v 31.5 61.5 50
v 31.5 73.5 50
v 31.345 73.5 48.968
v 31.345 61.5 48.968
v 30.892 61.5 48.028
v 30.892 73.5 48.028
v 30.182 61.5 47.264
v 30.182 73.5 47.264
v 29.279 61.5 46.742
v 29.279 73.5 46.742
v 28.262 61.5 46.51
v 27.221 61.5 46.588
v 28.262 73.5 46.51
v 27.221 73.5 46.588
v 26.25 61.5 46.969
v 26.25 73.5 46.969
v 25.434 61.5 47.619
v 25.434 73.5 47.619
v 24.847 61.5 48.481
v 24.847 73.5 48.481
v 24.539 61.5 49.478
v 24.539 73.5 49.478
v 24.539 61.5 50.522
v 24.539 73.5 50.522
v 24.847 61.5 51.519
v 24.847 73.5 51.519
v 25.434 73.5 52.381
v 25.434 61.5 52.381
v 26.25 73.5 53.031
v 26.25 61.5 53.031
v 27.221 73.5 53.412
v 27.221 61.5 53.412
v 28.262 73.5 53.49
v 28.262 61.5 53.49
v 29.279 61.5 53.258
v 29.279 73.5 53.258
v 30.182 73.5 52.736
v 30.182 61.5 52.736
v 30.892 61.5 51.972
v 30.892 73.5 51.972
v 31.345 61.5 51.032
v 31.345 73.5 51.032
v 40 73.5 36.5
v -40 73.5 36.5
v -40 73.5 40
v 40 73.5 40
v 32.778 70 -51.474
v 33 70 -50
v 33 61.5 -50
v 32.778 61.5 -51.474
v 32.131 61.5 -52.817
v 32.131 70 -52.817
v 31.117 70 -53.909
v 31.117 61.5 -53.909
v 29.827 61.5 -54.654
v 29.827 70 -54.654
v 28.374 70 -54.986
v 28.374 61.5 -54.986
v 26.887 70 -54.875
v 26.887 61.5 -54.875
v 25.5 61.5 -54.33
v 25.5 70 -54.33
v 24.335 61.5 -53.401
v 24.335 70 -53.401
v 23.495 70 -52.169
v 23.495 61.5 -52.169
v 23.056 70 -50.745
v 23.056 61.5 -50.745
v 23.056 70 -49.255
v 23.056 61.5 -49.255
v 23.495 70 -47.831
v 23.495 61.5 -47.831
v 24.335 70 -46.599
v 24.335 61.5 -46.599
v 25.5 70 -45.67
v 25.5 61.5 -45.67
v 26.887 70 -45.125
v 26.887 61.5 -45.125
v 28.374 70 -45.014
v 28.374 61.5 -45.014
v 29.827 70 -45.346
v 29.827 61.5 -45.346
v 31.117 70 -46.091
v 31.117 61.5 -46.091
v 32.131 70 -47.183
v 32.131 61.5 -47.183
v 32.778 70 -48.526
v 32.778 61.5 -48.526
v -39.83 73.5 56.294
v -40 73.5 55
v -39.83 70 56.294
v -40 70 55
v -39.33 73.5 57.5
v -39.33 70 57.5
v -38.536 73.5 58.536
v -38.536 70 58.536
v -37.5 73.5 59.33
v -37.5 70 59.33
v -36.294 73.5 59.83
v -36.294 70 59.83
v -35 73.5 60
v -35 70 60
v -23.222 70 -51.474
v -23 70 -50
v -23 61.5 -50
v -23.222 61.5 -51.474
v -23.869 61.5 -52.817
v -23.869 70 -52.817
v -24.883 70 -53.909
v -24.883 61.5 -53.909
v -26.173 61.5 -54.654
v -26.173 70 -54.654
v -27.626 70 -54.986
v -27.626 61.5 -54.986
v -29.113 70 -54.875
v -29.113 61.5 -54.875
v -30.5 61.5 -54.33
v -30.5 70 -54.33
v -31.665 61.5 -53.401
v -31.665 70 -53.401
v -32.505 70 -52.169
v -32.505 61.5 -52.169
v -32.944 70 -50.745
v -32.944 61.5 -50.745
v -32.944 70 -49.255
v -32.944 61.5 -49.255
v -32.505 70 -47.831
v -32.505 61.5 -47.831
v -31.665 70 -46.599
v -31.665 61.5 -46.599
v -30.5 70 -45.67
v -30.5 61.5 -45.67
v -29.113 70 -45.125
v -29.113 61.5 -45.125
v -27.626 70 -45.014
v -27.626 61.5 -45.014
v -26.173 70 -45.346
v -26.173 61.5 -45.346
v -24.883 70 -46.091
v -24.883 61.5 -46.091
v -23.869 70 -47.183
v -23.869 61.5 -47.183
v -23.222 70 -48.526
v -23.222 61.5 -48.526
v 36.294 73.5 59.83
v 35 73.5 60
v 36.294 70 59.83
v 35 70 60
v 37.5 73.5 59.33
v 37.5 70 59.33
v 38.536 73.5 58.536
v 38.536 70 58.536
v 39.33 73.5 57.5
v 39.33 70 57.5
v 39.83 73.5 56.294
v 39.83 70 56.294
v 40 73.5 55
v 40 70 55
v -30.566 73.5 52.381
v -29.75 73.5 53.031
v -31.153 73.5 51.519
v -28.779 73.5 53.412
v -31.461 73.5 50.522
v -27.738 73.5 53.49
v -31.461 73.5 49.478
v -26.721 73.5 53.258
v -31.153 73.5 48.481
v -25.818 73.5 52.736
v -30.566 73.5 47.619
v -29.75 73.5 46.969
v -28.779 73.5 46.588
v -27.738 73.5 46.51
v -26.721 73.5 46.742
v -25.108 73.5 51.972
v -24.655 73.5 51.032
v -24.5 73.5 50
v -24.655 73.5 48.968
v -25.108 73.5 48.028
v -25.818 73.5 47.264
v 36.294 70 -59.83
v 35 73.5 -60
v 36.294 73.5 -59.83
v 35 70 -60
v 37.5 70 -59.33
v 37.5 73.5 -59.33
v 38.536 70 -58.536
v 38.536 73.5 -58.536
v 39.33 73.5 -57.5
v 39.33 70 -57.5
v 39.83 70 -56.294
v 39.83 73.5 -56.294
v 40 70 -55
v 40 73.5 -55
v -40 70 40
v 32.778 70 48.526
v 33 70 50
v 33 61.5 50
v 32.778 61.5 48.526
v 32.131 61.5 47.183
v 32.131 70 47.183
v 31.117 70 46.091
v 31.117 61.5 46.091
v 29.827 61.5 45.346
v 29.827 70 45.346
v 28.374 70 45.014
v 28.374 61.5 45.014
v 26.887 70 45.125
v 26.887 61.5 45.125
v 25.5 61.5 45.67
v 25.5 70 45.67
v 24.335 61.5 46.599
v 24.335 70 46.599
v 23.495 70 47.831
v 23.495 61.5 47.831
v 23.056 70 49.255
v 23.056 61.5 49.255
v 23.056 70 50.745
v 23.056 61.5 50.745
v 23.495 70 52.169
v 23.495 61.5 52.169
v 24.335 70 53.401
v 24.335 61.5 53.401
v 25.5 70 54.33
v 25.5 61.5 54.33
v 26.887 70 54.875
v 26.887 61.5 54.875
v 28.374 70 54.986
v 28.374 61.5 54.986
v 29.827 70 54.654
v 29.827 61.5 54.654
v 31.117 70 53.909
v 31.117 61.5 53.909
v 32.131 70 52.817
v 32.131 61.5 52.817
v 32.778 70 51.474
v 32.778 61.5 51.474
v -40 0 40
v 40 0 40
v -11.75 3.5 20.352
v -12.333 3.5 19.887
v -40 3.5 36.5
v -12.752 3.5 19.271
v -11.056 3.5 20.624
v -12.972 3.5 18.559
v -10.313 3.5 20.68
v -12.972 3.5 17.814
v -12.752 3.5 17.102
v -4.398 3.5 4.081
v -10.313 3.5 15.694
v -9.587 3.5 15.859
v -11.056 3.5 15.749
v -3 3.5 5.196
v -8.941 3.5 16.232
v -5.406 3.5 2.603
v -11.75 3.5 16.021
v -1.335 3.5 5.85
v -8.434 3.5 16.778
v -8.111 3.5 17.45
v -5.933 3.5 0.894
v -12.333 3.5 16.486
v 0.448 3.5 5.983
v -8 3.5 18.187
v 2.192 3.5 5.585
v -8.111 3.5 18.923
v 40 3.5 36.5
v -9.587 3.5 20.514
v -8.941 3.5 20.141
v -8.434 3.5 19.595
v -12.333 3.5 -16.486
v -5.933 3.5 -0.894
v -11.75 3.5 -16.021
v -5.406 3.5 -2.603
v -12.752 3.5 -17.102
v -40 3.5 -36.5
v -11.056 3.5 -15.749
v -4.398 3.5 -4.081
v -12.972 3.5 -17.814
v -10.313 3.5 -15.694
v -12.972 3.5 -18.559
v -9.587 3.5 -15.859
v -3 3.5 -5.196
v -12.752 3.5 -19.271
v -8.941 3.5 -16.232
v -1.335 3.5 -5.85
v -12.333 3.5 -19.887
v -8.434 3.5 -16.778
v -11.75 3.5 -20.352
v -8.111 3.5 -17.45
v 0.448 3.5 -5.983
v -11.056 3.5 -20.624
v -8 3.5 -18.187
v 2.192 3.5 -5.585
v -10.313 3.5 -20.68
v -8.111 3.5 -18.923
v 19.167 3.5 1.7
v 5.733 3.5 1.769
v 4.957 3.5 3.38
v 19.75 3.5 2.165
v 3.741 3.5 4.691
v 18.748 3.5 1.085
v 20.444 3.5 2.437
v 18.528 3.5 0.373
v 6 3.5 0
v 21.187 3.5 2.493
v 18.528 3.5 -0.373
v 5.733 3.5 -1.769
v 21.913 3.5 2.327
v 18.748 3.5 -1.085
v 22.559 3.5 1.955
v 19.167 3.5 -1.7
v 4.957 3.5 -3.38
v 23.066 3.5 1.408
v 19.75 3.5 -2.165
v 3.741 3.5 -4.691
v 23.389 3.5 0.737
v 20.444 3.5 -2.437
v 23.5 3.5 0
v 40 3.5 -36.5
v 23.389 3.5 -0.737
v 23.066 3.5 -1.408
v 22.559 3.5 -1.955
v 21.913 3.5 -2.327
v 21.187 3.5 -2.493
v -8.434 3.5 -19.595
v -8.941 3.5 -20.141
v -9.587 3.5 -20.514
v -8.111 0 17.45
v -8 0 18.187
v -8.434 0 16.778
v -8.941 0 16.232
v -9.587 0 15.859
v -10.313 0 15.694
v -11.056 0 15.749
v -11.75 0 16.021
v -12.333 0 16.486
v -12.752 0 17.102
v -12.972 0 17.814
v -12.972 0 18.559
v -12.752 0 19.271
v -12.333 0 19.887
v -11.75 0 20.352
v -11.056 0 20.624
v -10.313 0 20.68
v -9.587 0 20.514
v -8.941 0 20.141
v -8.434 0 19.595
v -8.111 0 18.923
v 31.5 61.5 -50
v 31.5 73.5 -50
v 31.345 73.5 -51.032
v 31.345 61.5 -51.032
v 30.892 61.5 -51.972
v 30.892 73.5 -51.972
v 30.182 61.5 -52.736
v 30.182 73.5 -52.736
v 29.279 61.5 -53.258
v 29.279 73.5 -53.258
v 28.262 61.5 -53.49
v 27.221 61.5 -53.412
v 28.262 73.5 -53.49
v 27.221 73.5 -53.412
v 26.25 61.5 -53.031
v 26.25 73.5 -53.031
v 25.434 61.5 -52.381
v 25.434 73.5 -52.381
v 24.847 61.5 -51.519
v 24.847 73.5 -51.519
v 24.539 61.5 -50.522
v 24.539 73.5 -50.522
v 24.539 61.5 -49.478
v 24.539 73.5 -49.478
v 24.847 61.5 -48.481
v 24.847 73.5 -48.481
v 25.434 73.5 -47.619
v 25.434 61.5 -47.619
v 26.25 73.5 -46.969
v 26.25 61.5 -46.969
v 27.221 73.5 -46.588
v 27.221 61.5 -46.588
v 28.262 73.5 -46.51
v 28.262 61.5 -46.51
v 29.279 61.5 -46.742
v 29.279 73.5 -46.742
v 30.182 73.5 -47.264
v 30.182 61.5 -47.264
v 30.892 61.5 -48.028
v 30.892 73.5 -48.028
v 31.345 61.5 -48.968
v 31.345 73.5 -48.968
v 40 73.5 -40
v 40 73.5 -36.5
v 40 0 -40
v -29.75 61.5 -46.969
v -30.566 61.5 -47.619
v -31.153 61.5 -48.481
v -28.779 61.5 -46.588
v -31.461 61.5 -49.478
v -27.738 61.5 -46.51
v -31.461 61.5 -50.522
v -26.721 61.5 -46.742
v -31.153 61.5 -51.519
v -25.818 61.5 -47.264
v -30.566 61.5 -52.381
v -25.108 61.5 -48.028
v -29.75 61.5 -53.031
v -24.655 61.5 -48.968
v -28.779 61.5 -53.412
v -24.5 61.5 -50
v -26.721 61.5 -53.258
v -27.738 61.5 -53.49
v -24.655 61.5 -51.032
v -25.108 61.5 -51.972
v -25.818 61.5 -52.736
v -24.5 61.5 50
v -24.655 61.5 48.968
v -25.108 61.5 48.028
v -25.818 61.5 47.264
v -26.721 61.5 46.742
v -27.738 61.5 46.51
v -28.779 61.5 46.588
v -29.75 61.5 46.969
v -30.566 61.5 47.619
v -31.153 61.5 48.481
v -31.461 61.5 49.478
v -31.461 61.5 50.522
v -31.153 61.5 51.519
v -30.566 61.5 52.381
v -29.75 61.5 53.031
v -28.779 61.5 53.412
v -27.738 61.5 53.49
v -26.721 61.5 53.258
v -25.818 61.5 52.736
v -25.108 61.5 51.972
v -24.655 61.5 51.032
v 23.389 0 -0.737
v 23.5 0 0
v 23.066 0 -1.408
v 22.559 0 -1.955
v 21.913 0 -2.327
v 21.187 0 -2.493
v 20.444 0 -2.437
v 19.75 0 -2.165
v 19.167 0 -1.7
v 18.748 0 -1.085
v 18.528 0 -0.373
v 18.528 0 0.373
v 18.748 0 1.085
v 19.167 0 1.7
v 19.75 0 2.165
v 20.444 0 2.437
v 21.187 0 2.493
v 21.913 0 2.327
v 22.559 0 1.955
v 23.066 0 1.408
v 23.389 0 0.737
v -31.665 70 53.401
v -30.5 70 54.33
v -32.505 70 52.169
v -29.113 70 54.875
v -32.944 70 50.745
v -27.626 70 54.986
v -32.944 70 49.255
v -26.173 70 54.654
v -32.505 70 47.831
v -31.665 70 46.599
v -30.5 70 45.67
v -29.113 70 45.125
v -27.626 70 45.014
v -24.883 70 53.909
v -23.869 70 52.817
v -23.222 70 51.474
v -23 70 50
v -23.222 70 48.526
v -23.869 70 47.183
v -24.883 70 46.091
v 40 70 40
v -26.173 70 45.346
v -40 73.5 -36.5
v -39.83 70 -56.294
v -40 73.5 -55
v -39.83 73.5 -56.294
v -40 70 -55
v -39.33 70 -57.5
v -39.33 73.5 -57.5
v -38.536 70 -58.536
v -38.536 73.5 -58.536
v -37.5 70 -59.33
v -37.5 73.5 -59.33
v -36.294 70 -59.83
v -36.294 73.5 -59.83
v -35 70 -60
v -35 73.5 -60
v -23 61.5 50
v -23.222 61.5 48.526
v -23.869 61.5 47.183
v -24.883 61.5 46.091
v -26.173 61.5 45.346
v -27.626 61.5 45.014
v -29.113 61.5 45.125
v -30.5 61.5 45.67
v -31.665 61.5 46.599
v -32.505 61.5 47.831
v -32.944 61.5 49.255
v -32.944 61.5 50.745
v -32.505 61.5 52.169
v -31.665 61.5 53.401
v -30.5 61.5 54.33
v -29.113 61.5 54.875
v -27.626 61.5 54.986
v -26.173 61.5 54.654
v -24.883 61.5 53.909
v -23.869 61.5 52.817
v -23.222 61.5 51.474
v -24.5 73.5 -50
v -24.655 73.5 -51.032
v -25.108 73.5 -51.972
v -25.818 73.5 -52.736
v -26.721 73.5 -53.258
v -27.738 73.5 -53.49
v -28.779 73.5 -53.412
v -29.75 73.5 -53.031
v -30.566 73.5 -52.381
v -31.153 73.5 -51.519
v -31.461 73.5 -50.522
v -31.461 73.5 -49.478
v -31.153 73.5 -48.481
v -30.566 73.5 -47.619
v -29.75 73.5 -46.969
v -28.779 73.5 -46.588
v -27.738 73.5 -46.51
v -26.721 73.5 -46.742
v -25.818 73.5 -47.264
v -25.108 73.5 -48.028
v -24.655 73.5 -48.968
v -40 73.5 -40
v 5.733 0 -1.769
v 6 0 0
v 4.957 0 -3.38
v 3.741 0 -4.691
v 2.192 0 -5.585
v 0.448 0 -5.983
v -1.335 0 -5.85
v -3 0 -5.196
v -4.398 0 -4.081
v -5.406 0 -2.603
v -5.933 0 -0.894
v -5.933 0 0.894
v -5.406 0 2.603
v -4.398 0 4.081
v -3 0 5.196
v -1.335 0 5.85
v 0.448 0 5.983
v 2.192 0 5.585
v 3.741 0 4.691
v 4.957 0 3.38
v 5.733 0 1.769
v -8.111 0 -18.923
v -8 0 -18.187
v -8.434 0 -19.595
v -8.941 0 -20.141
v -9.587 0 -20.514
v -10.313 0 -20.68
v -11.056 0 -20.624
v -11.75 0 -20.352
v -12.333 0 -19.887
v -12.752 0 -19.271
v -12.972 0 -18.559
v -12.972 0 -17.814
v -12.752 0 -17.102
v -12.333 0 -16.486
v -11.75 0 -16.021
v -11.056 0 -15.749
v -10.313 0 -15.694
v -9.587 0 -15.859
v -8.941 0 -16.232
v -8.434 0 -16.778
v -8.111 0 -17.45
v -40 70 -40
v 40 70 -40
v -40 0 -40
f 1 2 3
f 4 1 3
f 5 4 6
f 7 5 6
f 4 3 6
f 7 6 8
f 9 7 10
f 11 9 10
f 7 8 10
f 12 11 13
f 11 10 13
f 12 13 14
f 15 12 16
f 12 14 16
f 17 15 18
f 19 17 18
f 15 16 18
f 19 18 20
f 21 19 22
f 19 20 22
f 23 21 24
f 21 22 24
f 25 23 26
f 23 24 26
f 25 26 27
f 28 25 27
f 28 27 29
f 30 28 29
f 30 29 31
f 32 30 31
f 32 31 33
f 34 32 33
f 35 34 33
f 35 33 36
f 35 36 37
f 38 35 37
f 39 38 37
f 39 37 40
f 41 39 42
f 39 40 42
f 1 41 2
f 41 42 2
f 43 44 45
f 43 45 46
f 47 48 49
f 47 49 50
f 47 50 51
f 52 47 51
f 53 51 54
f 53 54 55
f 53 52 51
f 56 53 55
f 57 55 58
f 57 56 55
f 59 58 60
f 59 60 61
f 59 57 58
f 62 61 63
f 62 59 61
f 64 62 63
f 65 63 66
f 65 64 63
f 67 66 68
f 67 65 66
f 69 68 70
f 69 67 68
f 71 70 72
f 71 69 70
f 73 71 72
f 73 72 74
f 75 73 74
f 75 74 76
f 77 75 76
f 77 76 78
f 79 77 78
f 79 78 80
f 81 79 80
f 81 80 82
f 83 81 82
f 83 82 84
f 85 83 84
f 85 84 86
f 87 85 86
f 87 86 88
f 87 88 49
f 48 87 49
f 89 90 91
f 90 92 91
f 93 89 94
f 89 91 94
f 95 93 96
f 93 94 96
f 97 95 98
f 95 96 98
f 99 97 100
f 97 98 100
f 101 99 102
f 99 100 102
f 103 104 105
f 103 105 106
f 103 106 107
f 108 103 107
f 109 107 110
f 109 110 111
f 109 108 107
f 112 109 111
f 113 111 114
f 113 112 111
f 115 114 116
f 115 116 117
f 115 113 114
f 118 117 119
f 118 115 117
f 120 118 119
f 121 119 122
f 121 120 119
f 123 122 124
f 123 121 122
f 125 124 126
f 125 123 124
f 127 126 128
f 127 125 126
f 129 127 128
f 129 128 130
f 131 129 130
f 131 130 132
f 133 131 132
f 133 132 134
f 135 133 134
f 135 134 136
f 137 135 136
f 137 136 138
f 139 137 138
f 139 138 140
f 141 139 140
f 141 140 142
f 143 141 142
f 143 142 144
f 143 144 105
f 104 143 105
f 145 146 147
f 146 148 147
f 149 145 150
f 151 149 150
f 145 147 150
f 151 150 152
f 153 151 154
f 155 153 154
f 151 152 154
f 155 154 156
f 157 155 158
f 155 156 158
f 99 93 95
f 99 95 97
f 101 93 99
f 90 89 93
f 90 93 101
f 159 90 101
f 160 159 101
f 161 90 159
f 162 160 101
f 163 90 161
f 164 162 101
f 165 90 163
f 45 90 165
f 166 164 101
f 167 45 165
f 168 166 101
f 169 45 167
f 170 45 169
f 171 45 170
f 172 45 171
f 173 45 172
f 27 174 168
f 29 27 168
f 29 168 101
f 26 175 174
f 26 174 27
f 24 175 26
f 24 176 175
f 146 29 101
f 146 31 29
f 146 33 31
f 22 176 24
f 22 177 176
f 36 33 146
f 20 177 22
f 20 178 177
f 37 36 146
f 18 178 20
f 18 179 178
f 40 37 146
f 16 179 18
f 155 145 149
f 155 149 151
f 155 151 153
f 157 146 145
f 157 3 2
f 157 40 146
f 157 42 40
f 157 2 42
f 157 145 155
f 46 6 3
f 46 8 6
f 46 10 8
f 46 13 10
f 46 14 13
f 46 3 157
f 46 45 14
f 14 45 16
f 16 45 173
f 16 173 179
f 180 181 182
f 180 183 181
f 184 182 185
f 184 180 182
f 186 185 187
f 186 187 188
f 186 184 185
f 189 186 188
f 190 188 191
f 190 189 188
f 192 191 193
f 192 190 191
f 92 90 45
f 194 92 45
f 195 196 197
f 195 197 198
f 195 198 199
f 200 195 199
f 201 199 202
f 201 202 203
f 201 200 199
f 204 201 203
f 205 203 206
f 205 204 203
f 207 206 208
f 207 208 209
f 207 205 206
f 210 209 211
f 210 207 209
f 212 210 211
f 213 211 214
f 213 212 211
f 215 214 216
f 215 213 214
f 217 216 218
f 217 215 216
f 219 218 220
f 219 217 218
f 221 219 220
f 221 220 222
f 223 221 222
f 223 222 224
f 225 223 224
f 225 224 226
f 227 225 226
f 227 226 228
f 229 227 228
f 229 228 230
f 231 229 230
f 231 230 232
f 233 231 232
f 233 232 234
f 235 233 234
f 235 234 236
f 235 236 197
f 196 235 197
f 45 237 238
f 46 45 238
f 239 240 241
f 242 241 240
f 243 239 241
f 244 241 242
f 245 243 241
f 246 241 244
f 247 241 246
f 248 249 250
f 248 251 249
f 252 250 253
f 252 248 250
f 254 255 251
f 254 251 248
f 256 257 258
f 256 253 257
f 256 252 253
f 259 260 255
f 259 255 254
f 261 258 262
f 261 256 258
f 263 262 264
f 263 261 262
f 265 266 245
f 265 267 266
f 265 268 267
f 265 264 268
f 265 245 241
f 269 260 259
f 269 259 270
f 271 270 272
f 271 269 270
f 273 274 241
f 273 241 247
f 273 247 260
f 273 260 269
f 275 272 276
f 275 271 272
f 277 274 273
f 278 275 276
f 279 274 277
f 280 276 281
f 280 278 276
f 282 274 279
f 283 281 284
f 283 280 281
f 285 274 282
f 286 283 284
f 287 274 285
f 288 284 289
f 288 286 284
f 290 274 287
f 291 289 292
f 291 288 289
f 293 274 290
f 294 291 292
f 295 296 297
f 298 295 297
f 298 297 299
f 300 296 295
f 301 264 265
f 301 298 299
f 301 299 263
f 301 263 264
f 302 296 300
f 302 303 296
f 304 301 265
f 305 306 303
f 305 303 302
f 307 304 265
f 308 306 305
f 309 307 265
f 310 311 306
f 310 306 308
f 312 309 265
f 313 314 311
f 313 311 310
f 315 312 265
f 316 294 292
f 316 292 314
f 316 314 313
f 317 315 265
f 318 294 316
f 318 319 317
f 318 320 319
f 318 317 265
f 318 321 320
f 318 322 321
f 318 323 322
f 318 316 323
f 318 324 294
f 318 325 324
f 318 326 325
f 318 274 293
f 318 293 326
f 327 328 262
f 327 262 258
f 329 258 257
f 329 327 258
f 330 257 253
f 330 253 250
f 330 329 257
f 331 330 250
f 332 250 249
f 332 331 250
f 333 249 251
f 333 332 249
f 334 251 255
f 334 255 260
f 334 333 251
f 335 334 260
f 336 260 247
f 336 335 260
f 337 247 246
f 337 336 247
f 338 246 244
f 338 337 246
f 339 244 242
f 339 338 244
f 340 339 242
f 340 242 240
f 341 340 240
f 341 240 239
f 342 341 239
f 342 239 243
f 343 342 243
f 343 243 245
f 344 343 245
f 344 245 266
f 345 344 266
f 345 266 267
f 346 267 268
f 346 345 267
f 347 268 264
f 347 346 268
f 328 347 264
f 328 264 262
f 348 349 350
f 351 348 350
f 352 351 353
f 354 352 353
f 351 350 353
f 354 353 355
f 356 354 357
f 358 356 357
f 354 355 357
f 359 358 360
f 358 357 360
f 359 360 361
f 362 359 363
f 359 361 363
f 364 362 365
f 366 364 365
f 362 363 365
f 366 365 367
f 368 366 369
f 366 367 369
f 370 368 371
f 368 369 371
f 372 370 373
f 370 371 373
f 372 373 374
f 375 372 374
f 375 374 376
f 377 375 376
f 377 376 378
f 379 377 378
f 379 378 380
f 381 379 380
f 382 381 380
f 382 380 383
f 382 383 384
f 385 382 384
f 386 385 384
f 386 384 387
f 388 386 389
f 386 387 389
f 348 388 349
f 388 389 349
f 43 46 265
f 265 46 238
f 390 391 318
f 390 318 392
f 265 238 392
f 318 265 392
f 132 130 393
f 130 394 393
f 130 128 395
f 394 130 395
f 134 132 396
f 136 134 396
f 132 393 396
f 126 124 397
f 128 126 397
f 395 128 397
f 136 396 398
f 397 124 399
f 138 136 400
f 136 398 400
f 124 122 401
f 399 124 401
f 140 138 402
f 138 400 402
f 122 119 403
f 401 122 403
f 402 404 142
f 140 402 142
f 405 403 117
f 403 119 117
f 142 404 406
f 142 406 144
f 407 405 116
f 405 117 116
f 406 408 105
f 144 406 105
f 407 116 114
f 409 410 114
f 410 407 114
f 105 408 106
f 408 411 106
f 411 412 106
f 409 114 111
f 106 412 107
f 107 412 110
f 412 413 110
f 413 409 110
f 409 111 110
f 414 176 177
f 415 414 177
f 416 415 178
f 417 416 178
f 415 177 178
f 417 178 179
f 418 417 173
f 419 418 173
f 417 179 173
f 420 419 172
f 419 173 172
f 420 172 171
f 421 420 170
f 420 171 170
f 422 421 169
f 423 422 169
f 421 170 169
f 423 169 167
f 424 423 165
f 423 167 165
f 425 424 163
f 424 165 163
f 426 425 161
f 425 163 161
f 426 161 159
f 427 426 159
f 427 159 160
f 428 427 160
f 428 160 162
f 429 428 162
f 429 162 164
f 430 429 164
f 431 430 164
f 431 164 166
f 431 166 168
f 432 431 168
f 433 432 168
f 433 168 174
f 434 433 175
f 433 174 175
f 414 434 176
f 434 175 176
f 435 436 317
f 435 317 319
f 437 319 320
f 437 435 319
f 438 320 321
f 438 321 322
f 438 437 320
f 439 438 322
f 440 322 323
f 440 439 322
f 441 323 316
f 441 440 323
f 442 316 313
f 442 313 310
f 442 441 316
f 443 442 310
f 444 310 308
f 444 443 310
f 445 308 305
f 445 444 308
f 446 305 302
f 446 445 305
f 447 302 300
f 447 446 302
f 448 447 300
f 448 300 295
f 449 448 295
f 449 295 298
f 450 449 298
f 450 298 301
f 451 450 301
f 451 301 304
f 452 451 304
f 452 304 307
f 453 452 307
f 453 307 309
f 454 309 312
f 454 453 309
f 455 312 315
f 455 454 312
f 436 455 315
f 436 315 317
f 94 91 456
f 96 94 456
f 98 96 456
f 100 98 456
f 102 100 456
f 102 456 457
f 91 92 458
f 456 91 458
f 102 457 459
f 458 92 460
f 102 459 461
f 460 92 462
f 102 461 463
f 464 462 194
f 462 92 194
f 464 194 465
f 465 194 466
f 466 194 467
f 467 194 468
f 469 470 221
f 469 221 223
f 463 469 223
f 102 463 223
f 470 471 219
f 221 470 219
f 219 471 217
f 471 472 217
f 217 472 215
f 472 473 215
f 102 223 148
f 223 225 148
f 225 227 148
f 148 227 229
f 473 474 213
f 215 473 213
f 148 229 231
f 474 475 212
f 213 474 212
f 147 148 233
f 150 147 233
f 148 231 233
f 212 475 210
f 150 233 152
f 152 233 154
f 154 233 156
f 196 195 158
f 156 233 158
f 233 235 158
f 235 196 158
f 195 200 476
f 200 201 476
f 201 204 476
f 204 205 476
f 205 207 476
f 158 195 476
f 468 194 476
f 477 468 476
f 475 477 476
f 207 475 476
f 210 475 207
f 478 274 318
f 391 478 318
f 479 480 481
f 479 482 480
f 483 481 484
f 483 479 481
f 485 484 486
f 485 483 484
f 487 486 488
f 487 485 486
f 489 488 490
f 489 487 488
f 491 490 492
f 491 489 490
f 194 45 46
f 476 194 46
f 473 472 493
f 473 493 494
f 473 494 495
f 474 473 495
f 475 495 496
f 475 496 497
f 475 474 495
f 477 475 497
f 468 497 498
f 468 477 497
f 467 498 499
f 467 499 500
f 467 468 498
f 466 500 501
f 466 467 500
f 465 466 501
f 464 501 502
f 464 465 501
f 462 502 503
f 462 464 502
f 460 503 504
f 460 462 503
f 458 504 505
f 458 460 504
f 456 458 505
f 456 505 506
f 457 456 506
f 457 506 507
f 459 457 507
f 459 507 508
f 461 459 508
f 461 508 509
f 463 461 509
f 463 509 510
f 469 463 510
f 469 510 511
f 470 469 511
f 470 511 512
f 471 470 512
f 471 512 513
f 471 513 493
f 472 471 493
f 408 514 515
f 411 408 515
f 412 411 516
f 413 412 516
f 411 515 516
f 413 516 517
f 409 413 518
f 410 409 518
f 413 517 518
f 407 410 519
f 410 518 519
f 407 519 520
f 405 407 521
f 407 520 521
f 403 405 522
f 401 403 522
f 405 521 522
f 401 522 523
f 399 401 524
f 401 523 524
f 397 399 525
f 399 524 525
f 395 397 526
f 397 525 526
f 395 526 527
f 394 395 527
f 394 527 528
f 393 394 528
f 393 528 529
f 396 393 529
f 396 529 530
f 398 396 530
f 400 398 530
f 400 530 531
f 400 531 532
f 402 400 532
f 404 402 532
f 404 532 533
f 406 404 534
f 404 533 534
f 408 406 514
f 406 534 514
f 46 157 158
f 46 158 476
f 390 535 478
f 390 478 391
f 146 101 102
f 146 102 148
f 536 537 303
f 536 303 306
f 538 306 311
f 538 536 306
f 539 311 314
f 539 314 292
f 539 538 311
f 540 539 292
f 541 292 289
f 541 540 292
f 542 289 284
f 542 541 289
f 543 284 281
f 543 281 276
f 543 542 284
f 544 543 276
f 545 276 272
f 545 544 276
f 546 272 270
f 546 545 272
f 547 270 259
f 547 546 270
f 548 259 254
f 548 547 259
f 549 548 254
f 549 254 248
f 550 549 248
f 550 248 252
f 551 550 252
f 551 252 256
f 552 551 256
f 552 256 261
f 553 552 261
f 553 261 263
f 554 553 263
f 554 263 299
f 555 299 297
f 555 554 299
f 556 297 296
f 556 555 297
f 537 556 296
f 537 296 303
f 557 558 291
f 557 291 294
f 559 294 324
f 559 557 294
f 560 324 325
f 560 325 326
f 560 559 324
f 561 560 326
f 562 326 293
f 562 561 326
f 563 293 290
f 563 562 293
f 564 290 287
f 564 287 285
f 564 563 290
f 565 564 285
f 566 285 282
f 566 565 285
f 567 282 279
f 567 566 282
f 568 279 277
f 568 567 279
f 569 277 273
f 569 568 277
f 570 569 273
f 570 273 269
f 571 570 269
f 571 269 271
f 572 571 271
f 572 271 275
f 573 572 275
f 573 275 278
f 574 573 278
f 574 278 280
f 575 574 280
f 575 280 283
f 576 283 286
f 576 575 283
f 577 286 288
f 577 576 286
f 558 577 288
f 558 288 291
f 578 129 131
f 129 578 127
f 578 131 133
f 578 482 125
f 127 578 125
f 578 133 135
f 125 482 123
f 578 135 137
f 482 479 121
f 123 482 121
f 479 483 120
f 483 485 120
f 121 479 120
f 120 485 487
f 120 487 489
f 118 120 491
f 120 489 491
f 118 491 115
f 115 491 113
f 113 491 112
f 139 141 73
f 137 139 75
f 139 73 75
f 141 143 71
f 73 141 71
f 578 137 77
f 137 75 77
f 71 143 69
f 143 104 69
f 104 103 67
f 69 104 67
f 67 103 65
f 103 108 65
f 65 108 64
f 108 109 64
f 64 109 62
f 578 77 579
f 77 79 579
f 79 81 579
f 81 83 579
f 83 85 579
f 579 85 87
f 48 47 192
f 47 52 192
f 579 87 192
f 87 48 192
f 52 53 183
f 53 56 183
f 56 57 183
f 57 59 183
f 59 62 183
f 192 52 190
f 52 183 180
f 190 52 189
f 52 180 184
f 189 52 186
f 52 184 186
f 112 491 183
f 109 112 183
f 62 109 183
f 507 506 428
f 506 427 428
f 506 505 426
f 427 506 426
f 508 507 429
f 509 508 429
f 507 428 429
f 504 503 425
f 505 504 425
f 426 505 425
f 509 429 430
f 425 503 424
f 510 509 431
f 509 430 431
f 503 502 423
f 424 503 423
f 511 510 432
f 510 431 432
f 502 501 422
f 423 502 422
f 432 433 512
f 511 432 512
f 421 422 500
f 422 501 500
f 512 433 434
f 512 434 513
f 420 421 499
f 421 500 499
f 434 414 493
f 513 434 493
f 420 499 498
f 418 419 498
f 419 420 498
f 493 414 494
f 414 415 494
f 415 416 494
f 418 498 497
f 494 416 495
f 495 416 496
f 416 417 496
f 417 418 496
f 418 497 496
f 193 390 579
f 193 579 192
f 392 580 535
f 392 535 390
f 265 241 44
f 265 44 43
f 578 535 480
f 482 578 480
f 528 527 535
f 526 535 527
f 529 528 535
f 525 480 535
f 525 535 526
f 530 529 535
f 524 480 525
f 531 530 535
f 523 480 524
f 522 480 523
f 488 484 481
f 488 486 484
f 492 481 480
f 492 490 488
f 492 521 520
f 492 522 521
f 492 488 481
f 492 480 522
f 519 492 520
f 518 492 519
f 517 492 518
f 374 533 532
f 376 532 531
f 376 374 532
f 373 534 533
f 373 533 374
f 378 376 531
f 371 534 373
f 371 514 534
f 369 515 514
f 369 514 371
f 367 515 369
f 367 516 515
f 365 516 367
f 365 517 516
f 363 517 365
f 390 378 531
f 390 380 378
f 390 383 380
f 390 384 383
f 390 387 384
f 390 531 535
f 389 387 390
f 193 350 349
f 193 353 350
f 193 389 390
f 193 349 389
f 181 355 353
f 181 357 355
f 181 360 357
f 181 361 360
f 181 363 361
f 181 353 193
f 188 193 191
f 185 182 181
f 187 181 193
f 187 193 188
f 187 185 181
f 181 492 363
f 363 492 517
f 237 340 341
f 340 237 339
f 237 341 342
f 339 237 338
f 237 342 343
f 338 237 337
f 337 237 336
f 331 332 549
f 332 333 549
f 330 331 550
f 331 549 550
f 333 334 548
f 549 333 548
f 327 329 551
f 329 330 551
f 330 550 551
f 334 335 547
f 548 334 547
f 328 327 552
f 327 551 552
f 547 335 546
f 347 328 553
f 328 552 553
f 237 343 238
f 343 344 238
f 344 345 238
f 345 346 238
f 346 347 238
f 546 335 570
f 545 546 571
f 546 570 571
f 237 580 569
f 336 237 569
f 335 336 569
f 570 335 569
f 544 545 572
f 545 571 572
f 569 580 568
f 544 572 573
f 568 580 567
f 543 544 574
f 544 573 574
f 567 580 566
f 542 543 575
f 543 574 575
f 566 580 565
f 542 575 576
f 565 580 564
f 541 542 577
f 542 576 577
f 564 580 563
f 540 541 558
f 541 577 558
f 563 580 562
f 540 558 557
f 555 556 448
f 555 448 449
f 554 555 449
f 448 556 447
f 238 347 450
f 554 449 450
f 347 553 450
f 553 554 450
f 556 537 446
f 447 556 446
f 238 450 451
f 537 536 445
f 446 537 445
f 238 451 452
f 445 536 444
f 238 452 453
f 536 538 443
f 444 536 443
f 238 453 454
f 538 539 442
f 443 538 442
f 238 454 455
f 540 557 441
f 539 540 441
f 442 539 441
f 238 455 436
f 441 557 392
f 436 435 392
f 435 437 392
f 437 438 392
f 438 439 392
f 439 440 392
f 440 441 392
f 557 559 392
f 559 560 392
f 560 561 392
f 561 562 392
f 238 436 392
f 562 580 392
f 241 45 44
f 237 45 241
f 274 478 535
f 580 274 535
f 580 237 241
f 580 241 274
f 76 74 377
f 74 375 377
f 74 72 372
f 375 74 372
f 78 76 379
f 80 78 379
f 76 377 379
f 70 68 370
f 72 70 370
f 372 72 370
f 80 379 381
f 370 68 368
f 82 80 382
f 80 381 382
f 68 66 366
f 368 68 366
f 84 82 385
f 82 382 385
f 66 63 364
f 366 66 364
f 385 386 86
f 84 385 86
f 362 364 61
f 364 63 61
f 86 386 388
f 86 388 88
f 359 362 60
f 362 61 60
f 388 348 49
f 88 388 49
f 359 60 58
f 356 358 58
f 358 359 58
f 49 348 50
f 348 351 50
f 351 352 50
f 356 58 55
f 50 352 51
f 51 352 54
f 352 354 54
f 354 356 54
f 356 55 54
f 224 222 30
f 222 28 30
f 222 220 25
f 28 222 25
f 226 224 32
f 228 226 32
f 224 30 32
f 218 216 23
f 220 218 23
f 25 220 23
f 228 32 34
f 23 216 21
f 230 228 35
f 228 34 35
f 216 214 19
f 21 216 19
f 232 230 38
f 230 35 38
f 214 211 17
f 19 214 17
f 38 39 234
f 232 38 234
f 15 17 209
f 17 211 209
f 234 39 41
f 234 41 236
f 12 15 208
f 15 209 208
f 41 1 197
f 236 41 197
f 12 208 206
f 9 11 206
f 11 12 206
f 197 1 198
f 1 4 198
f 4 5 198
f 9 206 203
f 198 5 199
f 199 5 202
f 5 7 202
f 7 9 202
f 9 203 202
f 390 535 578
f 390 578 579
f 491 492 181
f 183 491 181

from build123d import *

# Parameters (mm, degrees)
SKETCH1_W             = 80
SKETCH1_H             = 80
SKETCH1_R             = 2.5
SKETCH1_R_2           = 6
BOSS_EXTRUDE1_DEPTH   = 3.5
BOSS_EXTRUDE2_START   = 3.5
SKETCH1_4_W           = 80
SKETCH1_4_H           = 3.5
BOSS_EXTRUDE2_DEPTH   = 70
BOSS_EXTRUDE3_START   = 73.5
SKETCH1_5_W           = 80
SKETCH1_5_H           = 20
SKETCH1_5_R           = 5
BOSS_EXTRUDE3_DEPTH   = 3.5
BOSS_EXTRUDE3_2_DEPTH = 3.5
BOSS_EXTRUDE4_START   = 73.5
SKETCH1_6_R           = 5
SKETCH1_6_R_2         = 3.5
BOSS_EXTRUDE4_DEPTH   = 12
FILLET1_R             = 5
FILLET2_R             = 5


with BuildPart() as part:
    # Sketch1 → Boss-Extrude1 (new body)
    with BuildSketch(Plane(origin=(0, 0, 0), x_dir=(1, 0, 0), z_dir=(0, 1, 0))):
        Rectangle(SKETCH1_W, SKETCH1_H)
        with Locations((21, 0)):
            Circle(SKETCH1_R, mode=Mode.SUBTRACT)
        with Locations((-10.5, -18.186533479)):
            Circle(SKETCH1_R, mode=Mode.SUBTRACT)
        with Locations((-10.5, 18.186533479)):
            Circle(SKETCH1_R, mode=Mode.SUBTRACT)
        Circle(SKETCH1_R_2, mode=Mode.SUBTRACT)
    extrude(amount=BOSS_EXTRUDE1_DEPTH)

    # Sketch1_4 → Boss-Extrude2 (add)
    with BuildSketch(Plane(origin=(0, 0, 0), x_dir=(1, 0, 0), z_dir=(0, 1, 0)).offset(BOSS_EXTRUDE2_START)):
        with Locations((0, 38.25)):
            Rectangle(SKETCH1_4_W, SKETCH1_4_H)
        with Locations((0, -38.25)):
            Rectangle(SKETCH1_4_W, SKETCH1_4_H)
    extrude(amount=BOSS_EXTRUDE2_DEPTH)


with BuildPart() as body_2:
    # Sketch1_5 → Boss-Extrude3 (new body)
    with BuildSketch(Plane(origin=(0, 0, 0), x_dir=(1, 0, 0), z_dir=(0, 1, 0)).offset(BOSS_EXTRUDE3_START)):
        with Locations((0, -50)):
            Rectangle(SKETCH1_5_W, SKETCH1_5_H)
        with Locations((28, -50)):
            Circle(SKETCH1_5_R, mode=Mode.SUBTRACT)
        with Locations((-28, -50)):
            Circle(SKETCH1_5_R, mode=Mode.SUBTRACT)
    extrude(amount=-BOSS_EXTRUDE3_DEPTH)



with BuildPart() as body_3:
    # Sketch1_5 → Boss-Extrude3 2 (new body)
    with BuildSketch(Plane(origin=(0, 0, 0), x_dir=(1, 0, 0), z_dir=(0, 1, 0)).offset(BOSS_EXTRUDE3_START)):
        with Locations((0, 50)):
            Rectangle(SKETCH1_5_W, SKETCH1_5_H)
        with Locations((-28, 50)):
            Circle(SKETCH1_5_R, mode=Mode.SUBTRACT)
        with Locations((28, 50)):
            Circle(SKETCH1_5_R, mode=Mode.SUBTRACT)
    extrude(amount=-BOSS_EXTRUDE3_2_DEPTH)


with BuildPart() as body_2_1:
    add(body_2.part)

    add(body_3.part)  # Boss-Extrude4 merges body 3
    # Sketch1_6 → Boss-Extrude4 (add)
    with BuildSketch(Plane(origin=(0, 0, 0), x_dir=(1, 0, 0), z_dir=(0, 1, 0)).offset(BOSS_EXTRUDE4_START)):
        with Locations((28, -50)):
            Circle(SKETCH1_6_R)
        with Locations((28, -50)):
            Circle(SKETCH1_6_R_2, mode=Mode.SUBTRACT)
        with Locations((-28, -50)):
            Circle(SKETCH1_6_R)
        with Locations((-28, -50)):
            Circle(SKETCH1_6_R_2, mode=Mode.SUBTRACT)
        with Locations((-28, 50)):
            Circle(SKETCH1_6_R)
        with Locations((-28, 50)):
            Circle(SKETCH1_6_R_2, mode=Mode.SUBTRACT)
        with Locations((28, 50)):
            Circle(SKETCH1_6_R)
        with Locations((28, 50)):
            Circle(SKETCH1_6_R_2, mode=Mode.SUBTRACT)
    extrude(amount=-BOSS_EXTRUDE4_DEPTH)

    # Fillet1
    fillet1_edges = [body_2_1.edges().sort_by_distance(p)[0] for p in [
        (40, 71.75, -60),
        (-40, 71.75, -60),
    ]]
    fillet(fillet1_edges, radius=FILLET1_R)

    # Fillet2
    fillet2_edges = [body_2_1.edges().sort_by_distance(p)[0] for p in [
        (-40, 71.75, 60),
        (40, 71.75, 60),
    ]]
    fillet(fillet2_edges, radius=FILLET2_R)


solid = Compound([part.part, body_2_1.part])
